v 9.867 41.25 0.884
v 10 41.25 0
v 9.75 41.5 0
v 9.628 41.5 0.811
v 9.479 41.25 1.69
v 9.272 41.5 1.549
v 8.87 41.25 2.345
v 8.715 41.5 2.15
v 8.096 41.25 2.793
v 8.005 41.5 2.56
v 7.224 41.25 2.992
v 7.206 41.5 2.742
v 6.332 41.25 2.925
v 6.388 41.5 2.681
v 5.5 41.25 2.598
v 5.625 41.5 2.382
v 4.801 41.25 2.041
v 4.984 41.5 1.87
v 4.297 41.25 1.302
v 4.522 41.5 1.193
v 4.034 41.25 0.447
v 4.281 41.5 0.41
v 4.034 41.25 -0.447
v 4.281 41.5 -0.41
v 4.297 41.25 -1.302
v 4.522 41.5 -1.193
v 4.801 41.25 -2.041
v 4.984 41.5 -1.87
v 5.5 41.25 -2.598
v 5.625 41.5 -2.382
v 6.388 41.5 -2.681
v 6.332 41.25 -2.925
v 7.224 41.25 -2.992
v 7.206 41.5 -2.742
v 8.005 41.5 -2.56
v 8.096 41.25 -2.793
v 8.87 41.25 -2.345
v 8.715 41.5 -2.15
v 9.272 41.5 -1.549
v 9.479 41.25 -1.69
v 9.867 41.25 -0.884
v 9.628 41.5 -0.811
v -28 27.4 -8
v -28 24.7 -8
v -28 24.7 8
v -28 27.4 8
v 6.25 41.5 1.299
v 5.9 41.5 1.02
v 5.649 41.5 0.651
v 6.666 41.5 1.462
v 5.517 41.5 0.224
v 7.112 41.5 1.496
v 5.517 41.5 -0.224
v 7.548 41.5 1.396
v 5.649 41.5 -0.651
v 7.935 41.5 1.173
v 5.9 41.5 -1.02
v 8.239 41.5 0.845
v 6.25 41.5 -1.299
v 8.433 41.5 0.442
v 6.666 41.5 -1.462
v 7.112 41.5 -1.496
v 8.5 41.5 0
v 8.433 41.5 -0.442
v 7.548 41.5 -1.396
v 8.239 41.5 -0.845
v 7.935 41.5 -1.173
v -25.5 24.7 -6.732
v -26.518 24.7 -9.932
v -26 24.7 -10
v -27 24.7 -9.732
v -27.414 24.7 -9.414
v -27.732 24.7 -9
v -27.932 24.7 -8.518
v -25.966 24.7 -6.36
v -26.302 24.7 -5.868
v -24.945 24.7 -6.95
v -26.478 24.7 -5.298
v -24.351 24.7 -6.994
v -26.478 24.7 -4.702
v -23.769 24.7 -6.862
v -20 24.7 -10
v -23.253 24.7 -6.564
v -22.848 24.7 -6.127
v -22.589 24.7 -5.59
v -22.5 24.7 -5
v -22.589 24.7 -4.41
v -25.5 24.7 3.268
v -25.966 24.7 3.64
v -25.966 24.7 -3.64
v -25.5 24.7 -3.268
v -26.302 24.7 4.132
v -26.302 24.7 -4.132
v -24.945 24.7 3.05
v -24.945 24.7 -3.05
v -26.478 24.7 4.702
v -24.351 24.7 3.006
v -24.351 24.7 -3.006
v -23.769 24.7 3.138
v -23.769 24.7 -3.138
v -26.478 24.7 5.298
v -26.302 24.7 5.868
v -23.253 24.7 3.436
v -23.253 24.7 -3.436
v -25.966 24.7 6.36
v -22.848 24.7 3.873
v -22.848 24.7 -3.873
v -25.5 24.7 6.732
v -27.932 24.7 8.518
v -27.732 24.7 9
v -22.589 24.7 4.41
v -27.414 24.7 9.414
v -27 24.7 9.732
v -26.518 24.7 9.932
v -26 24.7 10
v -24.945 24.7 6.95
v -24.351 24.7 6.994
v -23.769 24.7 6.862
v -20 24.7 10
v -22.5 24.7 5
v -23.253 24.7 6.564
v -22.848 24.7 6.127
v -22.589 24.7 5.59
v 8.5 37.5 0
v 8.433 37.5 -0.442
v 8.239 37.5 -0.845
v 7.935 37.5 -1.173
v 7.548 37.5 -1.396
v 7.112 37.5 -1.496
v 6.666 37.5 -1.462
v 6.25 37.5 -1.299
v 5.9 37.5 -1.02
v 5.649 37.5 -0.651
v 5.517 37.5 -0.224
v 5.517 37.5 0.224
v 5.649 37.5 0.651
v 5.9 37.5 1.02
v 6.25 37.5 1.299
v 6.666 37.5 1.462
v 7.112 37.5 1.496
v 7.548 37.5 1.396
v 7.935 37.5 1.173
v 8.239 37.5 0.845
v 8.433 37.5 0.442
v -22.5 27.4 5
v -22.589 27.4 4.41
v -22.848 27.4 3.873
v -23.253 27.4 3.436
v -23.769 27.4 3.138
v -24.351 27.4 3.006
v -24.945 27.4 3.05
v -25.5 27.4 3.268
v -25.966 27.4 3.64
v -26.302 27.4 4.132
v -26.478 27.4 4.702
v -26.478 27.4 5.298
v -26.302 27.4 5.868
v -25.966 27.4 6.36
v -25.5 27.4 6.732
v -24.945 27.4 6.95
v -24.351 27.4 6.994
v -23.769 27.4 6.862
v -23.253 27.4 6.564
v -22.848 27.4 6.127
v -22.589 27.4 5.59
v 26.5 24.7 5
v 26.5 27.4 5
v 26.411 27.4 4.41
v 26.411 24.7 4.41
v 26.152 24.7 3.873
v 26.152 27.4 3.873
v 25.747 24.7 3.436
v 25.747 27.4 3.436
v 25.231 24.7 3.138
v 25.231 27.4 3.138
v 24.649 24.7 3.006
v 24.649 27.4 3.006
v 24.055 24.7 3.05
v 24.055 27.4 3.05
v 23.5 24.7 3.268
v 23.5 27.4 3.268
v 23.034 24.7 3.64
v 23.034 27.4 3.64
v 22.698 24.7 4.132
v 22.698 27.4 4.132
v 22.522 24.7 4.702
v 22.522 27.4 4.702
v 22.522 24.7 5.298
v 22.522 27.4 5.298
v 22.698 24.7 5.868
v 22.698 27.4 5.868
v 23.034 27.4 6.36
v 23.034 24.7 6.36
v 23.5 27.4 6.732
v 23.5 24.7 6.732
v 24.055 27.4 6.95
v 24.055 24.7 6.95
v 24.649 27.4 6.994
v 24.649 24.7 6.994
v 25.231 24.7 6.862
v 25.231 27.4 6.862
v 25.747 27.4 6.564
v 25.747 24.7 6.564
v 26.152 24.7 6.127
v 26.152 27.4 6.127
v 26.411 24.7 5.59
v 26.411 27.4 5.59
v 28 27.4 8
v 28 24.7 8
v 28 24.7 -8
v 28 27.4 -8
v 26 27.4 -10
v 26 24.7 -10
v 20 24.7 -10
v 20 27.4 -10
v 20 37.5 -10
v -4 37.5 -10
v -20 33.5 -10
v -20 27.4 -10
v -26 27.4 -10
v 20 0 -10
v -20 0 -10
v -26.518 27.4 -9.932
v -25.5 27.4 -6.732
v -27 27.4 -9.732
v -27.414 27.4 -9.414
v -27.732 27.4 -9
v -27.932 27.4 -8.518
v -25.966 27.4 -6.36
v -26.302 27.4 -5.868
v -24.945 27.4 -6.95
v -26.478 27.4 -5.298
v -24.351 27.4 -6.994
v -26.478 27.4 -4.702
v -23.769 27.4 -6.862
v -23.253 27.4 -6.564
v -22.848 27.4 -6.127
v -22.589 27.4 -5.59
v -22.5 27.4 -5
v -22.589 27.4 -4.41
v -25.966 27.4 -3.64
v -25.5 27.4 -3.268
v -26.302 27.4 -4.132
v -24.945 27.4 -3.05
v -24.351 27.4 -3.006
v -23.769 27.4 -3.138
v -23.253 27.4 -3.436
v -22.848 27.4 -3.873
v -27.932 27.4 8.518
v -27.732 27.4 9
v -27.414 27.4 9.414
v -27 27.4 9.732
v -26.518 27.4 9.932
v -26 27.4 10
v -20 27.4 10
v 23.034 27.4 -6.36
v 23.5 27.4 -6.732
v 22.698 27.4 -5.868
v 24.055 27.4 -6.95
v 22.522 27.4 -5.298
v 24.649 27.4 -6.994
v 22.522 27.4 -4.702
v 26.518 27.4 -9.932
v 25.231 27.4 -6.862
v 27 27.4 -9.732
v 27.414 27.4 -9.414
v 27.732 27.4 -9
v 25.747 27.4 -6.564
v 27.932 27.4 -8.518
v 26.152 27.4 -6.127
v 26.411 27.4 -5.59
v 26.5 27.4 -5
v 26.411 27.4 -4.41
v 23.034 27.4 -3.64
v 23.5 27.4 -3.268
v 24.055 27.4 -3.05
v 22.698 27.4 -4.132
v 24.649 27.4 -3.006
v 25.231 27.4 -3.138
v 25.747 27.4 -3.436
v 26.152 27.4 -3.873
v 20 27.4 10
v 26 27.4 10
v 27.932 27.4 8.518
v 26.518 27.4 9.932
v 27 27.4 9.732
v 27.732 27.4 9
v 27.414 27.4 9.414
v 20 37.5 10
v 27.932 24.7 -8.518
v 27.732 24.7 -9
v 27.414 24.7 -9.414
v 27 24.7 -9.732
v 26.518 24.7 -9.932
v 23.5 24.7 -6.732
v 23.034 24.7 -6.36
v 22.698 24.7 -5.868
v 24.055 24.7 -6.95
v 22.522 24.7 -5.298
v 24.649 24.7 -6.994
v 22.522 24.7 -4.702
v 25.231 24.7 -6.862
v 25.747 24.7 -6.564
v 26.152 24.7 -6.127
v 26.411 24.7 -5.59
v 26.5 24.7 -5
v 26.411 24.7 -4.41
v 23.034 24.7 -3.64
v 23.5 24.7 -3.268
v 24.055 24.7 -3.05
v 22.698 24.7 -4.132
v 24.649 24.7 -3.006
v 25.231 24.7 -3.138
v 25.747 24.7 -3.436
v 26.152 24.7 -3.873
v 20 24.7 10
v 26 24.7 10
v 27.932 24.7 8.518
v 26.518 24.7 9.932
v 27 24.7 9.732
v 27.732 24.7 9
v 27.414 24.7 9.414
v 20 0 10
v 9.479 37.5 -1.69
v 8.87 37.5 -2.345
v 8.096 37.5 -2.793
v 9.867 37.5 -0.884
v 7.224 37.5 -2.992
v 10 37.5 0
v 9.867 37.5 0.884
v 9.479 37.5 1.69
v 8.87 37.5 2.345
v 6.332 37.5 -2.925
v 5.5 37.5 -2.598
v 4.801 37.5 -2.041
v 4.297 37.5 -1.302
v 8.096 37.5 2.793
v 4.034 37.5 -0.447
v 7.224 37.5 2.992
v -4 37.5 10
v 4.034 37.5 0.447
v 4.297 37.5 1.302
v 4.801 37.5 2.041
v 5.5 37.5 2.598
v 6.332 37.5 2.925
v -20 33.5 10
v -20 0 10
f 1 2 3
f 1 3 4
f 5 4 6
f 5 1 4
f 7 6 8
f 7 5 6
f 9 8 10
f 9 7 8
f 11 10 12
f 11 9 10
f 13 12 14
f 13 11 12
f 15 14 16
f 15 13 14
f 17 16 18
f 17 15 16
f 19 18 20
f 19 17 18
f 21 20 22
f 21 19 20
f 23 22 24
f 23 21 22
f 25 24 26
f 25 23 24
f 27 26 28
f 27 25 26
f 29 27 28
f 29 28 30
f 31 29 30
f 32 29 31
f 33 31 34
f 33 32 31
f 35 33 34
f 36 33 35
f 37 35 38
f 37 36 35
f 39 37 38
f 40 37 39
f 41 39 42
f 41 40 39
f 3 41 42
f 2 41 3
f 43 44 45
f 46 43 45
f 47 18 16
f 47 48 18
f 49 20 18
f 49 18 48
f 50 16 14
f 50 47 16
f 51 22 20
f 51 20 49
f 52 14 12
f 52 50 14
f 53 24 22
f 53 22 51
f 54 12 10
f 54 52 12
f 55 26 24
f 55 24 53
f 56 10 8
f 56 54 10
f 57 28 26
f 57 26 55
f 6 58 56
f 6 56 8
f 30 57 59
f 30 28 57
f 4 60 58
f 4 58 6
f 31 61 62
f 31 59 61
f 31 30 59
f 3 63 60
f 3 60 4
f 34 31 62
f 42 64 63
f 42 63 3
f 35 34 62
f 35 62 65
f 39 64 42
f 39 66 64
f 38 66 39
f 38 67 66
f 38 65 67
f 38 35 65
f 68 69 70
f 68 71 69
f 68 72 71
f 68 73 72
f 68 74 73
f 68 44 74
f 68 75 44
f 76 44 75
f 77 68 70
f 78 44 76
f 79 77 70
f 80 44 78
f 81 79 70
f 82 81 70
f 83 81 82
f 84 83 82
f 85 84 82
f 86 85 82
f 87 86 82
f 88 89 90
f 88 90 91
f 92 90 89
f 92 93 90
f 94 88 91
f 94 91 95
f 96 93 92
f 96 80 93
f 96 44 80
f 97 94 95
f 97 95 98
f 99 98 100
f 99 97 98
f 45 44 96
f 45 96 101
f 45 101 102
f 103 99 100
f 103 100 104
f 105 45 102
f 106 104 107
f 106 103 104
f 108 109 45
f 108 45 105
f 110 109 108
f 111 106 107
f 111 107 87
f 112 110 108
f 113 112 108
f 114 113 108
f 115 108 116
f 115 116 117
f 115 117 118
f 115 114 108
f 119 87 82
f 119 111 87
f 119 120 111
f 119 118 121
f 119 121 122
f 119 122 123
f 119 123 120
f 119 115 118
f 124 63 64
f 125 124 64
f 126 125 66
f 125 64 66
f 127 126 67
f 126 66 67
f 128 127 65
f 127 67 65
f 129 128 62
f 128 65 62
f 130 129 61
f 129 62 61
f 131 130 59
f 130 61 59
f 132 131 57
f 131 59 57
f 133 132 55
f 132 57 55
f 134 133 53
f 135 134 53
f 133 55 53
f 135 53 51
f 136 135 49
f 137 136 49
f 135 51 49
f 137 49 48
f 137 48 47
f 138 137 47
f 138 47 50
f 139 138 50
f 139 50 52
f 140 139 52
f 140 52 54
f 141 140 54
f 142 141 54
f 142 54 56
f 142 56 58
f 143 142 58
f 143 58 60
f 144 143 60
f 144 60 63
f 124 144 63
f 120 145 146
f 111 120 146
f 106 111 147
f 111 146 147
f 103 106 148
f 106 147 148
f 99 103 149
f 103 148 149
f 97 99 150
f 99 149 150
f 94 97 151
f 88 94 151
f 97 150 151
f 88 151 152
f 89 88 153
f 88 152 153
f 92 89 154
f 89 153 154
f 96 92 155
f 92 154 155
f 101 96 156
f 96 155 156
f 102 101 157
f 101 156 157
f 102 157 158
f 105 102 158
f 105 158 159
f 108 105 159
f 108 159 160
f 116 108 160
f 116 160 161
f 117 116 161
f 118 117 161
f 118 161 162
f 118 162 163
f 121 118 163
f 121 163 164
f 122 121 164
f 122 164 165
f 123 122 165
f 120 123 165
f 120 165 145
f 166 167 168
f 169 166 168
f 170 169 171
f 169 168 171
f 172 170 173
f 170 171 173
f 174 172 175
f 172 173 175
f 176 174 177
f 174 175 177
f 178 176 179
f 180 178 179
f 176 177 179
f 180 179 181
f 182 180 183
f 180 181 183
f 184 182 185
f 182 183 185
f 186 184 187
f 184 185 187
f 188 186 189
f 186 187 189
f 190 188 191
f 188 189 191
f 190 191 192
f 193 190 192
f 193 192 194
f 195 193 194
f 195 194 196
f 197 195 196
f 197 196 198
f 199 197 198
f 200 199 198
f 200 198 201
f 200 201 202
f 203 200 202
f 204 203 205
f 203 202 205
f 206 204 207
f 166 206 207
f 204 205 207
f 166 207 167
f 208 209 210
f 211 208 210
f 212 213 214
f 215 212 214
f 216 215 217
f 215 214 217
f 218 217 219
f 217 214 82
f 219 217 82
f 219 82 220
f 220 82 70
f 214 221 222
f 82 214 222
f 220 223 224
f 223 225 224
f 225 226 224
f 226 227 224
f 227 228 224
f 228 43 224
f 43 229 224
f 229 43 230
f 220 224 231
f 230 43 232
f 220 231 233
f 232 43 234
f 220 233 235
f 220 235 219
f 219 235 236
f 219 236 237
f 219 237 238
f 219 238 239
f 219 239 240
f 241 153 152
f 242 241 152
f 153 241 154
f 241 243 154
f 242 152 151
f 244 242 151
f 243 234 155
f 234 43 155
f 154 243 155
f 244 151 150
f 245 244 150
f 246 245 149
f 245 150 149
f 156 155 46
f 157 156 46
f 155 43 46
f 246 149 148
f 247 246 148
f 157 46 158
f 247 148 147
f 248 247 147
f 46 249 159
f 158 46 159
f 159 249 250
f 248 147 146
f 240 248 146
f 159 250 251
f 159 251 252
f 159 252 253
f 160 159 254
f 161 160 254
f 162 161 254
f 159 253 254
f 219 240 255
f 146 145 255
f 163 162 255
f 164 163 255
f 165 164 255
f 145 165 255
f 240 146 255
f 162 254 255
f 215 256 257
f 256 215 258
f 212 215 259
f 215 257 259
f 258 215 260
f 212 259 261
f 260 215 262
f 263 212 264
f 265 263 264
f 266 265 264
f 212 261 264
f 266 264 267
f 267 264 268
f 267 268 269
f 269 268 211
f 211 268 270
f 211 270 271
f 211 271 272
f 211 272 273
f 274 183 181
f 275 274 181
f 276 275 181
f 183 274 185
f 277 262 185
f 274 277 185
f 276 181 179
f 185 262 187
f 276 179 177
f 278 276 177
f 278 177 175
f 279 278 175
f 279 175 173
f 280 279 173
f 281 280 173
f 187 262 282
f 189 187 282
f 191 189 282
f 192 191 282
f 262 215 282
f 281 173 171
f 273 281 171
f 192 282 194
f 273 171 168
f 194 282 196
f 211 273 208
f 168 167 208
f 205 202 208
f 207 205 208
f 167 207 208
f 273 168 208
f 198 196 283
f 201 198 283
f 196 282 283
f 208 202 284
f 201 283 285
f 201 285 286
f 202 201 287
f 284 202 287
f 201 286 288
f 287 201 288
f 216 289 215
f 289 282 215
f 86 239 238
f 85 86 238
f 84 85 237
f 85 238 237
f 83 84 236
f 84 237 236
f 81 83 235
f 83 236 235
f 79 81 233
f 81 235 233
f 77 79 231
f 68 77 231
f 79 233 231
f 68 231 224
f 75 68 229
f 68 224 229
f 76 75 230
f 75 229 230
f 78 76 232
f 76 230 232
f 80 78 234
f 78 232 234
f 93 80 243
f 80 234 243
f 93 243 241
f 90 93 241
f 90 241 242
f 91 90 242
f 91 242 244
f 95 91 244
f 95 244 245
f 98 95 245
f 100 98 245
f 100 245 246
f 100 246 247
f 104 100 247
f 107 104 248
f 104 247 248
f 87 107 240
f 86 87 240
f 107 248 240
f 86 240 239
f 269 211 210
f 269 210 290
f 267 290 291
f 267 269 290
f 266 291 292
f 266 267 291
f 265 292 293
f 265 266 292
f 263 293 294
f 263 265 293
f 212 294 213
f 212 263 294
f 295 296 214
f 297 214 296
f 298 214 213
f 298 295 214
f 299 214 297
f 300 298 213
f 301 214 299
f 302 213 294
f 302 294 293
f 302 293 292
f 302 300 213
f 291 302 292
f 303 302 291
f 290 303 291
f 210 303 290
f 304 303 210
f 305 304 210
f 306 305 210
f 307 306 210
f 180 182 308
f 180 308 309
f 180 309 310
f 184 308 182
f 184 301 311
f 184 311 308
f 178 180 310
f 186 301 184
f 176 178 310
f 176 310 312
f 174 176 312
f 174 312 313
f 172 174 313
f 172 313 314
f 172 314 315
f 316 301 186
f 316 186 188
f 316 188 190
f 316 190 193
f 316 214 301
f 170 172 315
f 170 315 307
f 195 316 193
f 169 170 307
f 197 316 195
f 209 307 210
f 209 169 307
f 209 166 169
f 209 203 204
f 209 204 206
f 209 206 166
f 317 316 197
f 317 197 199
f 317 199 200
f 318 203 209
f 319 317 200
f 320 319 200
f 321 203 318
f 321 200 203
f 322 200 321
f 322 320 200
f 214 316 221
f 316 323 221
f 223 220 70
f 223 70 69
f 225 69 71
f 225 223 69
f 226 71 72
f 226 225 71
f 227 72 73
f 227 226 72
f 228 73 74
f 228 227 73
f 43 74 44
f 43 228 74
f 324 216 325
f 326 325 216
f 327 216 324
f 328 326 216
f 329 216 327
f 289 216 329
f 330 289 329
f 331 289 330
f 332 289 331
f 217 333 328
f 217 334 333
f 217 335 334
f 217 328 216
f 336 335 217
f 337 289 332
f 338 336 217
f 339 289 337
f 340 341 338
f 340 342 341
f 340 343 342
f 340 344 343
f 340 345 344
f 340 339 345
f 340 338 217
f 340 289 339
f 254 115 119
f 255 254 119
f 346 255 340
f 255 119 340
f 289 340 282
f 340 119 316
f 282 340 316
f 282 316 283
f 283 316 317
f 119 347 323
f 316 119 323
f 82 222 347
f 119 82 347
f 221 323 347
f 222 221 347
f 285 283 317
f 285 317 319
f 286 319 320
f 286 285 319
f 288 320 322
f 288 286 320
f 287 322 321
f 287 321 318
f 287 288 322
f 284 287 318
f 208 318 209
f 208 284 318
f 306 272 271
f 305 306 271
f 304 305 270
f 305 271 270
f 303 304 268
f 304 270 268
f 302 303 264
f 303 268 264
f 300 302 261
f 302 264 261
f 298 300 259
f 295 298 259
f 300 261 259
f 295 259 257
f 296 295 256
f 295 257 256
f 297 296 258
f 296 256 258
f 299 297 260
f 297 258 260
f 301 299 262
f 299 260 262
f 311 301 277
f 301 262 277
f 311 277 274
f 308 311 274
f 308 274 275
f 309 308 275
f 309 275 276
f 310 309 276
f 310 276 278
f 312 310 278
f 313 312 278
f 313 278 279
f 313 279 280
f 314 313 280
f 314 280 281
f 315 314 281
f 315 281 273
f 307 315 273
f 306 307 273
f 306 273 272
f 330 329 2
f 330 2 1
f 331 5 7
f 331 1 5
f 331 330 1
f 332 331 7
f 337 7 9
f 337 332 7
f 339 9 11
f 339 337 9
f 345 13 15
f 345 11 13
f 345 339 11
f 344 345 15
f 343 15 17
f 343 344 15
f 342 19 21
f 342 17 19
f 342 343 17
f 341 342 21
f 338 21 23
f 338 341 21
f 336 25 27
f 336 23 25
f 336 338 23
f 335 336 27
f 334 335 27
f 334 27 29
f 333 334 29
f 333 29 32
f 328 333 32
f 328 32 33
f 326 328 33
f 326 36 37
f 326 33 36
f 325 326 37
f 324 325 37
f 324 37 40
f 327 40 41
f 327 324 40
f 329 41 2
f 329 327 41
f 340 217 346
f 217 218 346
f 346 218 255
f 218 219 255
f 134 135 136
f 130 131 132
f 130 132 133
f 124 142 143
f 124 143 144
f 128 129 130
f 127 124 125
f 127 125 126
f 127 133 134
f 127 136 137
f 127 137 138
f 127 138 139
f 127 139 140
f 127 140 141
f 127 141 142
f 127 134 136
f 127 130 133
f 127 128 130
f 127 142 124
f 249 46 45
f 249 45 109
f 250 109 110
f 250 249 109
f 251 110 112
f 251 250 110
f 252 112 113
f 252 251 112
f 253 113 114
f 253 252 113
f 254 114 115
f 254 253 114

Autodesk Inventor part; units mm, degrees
ref_plane "YZ Plane" through (0, 0, 0) normal (1, 0, 0) x (0, 1, 0)
ref_plane "XZ Plane" through (0, 0, 0) normal (0, 1, 0) x (-1, 0, 0)
sketch "Sketch1" plane through (0, 0, 0) normal (0, 1, 0) x (-1, 0, 0)
  line L0 (20, 10) -> (-20, 10)
  line L1 (-20, 10) -> (-20, -10)
  line L2 (-20, -10) -> (20, -10)
  line L3 (20, -10) -> (20, 10)
  line L4 (20, 10) -> (-20, -10) construction
  line L5 (-20, 10) -> (20, -10) construction
  point P0 (0, 0)
  dimension "d0" = 40
  dimension "d1" = 20
extrude "Extrusion1" add sketch "Sketch1" along normal blind 37.5
ref_plane "Work Plane1" through (0, 24.7, 0) normal (0, -1, 0) x (1, 0, 0)
sketch "Sketch2" plane through (0, 24.7, 0) normal (0, -1, 0) x (1, 0, 0)
  line L0 (-28, 10) -> (28, 10)
  line L1 (28, 10) -> (28, -10)
  line L2 (28, -10) -> (-28, -10)
  line L3 (-28, -10) -> (-28, 10)
  line L4 (-28, 10) -> (28, -10) construction
  line L5 (28, 10) -> (-28, -10) construction
  point P0 (0, 0)
  dimension "d5" = 56
  dimension "d6" = 20
extrude "Extrusion2" add sketch "Sketch2" against normal blind 2.7
sketch "Sketch3" plane through (0, 27.4, 0) normal (0, 1, 0) x (1, 0, 0)
  circle A0 centre (-24.5, -5) radius 2
  line L0 (-28, 10) -> (-28, -10) construction
  line L1 (-28, 0) -> (28, 0) construction
  line L2 (28, 10) -> (28, -10) construction
  line L3 (-20, -10) -> (20, -10) projected
  line L4 (0, -10) -> (0, 10) construction
  line L5 (20, 10) -> (-20, 10) projected
  circle A1 centre (-24.5, 5) radius 2
  circle A2 centre (24.5, -5) radius 2
  circle A3 centre (24.5, 5) radius 2
  point P0 (0, 0)
  dimension "d9" = 4
  dimension "d10" = 5
  dimension "d11" = 24.5
extrude "Extrusion3" cut sketch "Sketch3" against normal up to surface (2.7 mm away)
sketch "Sketch4" plane through (0, 37.5, 0) normal (0, 1, 0) x (1, 0, 0)
  circle A0 centre (7, 0) radius 3
  line L0 (20, -10) -> (20, 10) projected
  point P0 (0, 0)
  dimension "d14" = 6
  dimension "d15" = 13
extrude "Extrusion4" add sketch "Sketch4" along normal blind 4
fillet "Fillet1" radius 2 4 edges at (-28, 26.05, 10) (28, 26.05, 10) (28, 26.05, -10) (-28, 26.05, -10)
chamfer "Chamfer1" distance 16 distance2 4 1 edges at (-20, 37.5, 0) measured on face at (-12, 37.5, 0)
sketch "Sketch5" plane through (7, 41.5, 0) normal (0, 1, 0) x (1, 0, 0)
  circle A0 centre (0, 0) radius 1.5
  circle A1 centre (0, 0) radius 3 construction
  point P0 (-7, 0)
  dimension "d22" = 3
extrude "Extrusion5" cut sketch "Sketch5" against normal blind 4
chamfer "Chamfer2" distance 0.25 angle 45 1 edges at (4, 41.5, 0)
properties part number "INJORA 35KG Digital Servo"
